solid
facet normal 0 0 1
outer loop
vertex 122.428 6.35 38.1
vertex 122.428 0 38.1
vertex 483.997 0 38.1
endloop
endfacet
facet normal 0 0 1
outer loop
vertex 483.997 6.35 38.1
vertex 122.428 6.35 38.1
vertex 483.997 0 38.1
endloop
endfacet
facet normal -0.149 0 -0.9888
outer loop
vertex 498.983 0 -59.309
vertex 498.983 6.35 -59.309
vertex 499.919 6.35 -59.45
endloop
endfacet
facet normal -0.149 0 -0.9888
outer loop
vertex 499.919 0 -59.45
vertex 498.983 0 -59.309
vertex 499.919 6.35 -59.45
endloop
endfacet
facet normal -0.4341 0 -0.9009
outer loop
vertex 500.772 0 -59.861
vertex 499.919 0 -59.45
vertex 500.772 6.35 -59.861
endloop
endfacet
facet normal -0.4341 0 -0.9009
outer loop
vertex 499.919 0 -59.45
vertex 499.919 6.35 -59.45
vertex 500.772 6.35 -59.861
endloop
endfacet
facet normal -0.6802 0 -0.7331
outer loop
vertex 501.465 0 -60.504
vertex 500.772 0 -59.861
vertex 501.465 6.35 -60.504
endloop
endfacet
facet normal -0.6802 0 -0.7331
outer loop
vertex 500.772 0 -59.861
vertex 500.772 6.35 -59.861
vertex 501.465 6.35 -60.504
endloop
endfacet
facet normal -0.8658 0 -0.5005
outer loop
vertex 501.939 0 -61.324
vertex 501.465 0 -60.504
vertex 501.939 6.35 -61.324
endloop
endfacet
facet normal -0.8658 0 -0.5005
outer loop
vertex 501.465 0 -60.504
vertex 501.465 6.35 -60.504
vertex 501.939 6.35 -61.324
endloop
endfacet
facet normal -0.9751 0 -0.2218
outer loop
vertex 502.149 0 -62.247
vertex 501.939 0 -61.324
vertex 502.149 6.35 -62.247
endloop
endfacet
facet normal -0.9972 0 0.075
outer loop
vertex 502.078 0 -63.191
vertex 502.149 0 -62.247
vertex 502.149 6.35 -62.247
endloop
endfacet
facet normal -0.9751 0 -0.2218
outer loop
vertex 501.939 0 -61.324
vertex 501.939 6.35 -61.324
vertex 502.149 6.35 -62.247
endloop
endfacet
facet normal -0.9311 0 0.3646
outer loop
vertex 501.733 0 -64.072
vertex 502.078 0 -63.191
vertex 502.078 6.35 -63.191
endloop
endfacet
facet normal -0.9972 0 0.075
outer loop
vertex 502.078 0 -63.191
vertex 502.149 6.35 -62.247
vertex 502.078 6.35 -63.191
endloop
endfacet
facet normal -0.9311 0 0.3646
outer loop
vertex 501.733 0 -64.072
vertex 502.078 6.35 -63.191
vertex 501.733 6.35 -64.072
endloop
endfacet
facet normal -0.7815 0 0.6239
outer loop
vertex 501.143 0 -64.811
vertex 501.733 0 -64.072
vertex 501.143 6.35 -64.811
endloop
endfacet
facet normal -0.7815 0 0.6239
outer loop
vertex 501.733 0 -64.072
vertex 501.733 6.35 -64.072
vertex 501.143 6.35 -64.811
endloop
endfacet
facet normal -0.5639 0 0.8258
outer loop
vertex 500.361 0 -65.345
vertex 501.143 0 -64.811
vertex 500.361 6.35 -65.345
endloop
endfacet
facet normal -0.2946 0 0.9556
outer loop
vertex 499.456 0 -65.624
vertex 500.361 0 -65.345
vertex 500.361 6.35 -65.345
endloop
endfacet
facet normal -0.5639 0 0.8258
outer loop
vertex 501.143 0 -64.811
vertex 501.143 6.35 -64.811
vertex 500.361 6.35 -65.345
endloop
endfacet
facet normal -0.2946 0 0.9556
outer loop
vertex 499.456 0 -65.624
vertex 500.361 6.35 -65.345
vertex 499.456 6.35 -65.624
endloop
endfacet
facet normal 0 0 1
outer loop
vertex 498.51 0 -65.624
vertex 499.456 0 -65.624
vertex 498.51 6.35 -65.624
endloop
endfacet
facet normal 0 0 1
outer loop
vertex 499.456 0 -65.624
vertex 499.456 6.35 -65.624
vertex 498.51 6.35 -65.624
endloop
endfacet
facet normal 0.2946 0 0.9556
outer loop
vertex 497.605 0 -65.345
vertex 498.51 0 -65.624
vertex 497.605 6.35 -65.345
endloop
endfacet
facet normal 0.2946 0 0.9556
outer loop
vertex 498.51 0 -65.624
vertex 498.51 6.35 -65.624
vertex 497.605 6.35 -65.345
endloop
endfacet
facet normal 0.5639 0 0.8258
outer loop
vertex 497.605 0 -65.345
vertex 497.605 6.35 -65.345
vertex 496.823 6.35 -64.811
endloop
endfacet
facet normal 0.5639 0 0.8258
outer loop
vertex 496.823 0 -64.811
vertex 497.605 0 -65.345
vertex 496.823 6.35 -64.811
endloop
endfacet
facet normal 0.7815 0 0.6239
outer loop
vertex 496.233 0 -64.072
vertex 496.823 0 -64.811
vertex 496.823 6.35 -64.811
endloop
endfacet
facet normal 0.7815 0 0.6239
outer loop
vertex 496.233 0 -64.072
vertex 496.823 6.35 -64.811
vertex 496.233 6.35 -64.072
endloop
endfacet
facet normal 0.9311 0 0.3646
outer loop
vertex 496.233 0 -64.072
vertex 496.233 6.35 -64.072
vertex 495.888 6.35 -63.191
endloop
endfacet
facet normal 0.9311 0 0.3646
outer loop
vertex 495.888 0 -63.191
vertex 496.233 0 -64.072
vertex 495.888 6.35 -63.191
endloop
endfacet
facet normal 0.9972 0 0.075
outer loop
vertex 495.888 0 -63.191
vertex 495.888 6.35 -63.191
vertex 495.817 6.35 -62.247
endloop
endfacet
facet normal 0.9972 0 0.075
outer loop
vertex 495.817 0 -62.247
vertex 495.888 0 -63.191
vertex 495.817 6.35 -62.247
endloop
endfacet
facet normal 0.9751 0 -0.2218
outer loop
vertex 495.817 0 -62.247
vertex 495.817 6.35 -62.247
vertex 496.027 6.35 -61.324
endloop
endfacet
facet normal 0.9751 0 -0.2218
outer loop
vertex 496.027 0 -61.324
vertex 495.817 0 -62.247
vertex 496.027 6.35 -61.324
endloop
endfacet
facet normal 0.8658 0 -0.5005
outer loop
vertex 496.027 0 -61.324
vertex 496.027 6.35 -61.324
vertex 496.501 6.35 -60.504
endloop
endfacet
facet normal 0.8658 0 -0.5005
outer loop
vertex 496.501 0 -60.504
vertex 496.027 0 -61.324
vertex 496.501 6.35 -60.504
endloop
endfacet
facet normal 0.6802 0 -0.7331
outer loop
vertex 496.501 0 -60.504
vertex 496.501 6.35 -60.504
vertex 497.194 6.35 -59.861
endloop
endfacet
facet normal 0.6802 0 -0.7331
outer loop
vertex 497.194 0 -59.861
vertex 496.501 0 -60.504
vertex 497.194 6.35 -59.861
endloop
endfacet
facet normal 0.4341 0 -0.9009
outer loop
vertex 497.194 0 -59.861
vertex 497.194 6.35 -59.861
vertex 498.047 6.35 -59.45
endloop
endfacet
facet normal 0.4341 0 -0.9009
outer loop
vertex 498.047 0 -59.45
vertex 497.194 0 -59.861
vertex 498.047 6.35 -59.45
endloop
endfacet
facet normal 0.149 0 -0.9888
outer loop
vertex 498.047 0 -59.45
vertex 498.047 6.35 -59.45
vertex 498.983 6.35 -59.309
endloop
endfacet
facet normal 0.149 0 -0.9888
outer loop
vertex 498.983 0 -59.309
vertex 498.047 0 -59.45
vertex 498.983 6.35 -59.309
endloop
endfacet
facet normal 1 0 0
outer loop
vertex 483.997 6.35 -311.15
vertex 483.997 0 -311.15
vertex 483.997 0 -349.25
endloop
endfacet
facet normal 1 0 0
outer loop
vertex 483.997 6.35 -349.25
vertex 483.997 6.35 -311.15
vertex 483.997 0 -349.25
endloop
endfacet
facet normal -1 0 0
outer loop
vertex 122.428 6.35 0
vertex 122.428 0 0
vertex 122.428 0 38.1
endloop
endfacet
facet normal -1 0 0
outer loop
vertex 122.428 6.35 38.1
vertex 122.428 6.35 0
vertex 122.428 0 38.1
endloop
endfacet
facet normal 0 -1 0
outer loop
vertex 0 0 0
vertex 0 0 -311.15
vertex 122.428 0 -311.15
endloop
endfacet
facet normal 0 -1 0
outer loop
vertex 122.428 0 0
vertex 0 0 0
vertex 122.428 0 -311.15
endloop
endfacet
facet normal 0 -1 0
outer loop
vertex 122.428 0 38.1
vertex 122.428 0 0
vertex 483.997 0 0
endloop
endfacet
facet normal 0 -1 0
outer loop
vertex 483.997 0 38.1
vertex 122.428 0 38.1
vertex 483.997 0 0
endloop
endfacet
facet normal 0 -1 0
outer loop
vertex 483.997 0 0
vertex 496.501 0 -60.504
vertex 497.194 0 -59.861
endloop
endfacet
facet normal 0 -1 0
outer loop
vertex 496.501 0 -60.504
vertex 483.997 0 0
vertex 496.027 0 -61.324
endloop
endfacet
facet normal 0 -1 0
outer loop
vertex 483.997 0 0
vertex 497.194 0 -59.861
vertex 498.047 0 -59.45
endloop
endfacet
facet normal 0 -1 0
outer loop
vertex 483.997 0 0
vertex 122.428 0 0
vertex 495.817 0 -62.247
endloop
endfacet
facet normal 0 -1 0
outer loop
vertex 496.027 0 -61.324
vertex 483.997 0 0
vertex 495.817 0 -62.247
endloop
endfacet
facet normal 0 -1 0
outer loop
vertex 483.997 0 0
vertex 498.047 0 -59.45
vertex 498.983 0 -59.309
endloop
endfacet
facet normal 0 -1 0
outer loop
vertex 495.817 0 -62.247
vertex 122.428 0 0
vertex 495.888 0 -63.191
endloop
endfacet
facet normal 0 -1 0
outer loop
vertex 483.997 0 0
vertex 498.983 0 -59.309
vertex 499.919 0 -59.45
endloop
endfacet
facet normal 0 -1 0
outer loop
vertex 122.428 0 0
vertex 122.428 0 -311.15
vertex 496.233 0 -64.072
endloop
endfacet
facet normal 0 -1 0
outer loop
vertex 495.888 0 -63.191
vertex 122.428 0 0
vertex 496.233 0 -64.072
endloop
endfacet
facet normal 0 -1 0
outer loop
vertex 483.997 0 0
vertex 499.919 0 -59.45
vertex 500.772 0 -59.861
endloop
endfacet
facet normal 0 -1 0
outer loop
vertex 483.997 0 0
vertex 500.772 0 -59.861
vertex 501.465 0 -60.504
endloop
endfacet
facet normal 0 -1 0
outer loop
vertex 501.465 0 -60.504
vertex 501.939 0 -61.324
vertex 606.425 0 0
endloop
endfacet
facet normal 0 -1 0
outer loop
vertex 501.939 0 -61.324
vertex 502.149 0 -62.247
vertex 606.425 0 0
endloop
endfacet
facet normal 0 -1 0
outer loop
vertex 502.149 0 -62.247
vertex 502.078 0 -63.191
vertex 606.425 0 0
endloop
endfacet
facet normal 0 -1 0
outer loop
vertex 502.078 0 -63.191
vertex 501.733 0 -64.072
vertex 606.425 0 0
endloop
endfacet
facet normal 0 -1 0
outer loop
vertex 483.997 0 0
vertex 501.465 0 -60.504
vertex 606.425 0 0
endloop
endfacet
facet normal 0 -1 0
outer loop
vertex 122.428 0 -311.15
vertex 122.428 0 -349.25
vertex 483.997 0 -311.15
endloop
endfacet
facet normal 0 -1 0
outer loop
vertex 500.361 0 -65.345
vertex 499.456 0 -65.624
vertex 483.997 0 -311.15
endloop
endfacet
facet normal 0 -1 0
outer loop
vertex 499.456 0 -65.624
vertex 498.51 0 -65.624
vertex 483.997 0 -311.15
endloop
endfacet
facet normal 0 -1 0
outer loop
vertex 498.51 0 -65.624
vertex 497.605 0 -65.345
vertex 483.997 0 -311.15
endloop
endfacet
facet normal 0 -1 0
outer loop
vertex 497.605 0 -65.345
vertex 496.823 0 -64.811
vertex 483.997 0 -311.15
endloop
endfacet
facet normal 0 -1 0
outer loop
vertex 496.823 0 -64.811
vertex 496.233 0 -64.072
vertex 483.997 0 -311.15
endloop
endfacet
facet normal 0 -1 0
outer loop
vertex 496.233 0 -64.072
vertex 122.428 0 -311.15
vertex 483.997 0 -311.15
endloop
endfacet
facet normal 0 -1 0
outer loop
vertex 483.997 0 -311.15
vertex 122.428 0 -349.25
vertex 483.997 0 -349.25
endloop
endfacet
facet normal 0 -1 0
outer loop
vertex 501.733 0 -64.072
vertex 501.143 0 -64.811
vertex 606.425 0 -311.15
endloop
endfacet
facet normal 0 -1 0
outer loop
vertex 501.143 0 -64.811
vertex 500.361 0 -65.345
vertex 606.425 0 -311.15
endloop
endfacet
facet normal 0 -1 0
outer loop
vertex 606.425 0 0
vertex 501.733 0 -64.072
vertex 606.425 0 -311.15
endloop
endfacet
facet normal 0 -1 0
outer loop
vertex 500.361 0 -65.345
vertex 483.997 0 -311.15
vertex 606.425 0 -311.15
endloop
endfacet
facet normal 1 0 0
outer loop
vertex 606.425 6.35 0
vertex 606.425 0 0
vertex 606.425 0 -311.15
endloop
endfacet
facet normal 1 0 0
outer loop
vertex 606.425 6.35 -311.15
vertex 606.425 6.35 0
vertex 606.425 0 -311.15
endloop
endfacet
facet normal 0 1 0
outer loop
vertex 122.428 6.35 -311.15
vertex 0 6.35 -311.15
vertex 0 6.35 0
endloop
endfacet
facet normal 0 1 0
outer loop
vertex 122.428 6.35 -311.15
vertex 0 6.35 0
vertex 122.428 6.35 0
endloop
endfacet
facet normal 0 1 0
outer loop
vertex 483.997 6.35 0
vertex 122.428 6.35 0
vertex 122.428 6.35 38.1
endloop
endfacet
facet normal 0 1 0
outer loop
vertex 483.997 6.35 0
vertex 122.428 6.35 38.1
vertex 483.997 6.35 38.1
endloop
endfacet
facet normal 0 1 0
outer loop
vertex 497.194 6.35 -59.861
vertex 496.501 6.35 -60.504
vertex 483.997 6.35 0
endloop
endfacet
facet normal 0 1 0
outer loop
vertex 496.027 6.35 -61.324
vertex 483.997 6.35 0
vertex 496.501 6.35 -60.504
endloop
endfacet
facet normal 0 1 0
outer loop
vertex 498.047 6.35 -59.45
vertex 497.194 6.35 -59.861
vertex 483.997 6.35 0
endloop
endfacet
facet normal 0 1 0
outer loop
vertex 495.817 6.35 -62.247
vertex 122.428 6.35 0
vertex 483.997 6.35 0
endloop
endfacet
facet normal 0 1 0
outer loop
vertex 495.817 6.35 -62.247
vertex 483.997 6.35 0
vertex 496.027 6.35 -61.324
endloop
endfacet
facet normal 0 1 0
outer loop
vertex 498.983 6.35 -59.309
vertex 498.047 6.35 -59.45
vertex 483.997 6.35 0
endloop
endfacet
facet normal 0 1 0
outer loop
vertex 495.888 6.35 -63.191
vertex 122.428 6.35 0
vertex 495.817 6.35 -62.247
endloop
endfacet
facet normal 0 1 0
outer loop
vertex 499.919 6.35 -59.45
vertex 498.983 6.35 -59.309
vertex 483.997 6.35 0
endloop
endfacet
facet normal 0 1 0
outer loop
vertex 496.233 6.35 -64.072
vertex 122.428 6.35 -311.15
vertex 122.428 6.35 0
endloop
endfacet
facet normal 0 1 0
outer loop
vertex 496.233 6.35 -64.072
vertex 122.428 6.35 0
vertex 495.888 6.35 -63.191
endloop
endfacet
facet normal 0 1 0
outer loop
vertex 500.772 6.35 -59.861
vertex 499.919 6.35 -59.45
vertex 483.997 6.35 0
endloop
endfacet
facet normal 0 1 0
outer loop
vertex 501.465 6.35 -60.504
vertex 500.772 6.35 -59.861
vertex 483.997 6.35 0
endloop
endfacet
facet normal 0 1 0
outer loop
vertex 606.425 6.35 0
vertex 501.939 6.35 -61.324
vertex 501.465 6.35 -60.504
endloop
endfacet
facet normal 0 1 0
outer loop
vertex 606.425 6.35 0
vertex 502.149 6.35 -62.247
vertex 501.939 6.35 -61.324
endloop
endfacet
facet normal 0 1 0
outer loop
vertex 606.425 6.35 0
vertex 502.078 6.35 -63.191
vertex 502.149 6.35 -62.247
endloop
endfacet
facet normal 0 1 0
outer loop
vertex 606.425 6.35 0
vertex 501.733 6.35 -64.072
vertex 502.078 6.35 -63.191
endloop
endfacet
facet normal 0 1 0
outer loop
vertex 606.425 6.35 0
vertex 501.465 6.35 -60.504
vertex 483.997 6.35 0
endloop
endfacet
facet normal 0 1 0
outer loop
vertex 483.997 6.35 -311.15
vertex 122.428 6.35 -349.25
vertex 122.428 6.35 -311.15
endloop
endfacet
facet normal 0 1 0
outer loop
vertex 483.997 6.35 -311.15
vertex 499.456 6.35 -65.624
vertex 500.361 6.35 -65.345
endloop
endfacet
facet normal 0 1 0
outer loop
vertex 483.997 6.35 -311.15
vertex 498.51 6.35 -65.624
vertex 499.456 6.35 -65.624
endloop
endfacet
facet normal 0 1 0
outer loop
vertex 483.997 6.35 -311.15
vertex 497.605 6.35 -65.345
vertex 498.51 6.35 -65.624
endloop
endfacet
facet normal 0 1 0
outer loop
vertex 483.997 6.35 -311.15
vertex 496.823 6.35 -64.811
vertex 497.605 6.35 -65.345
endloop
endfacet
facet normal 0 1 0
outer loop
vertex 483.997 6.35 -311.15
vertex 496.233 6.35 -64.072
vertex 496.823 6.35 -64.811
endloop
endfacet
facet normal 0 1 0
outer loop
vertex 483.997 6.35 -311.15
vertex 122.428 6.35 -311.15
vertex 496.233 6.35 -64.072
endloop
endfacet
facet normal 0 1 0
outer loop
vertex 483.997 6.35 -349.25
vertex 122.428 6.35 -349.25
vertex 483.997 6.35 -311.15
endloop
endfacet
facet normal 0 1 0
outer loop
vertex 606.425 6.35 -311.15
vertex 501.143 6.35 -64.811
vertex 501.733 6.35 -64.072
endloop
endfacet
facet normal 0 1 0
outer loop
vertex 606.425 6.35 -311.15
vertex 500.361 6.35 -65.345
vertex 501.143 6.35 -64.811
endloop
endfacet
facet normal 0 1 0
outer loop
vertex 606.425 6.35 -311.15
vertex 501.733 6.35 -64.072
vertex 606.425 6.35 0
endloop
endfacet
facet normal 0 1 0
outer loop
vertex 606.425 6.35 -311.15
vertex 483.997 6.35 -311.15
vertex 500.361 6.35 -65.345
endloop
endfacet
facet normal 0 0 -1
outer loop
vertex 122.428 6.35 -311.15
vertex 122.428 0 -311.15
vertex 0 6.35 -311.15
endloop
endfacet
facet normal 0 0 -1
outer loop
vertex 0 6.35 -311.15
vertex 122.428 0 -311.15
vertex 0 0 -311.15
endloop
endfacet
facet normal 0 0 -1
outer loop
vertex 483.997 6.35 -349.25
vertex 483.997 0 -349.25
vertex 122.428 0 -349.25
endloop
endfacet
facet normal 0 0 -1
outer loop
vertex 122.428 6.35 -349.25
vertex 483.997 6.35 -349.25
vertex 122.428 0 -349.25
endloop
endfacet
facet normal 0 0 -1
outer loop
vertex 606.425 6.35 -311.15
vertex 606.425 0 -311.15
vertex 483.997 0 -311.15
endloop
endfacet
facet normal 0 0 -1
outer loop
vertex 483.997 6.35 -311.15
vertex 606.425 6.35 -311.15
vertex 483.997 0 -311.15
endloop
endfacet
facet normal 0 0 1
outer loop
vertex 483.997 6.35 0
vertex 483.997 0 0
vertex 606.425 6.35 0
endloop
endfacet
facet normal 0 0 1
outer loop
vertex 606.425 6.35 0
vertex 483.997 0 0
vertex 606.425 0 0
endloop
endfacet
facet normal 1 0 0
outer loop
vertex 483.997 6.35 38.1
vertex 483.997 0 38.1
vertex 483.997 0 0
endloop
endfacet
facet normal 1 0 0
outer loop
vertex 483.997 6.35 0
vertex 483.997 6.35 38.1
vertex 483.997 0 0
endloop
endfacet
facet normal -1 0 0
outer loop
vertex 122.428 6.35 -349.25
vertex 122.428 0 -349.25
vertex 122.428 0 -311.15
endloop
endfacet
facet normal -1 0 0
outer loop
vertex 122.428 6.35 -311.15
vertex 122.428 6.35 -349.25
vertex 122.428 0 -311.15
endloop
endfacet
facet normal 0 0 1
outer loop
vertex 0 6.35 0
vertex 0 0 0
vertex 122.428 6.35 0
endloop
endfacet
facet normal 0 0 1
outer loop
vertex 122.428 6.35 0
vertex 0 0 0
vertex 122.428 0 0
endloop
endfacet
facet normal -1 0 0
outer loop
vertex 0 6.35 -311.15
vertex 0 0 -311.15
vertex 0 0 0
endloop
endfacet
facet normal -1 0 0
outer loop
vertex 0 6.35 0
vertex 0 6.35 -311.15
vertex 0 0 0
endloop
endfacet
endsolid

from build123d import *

# Parameters (mm, degrees)
BOSS_EXTRUDE1_DEPTH = 6.35
SKETCH2_R           = 3.175
CUT_EXTRUDE1_DEPTH  = 700.833669971


with BuildPart() as part:
    # Sketch1 → Boss-Extrude1 (new body)
    with BuildSketch(Plane(origin=(0, 0, 0), x_dir=(1, 0, 0), z_dir=(0, 1, 0))):
        Polygon((122.428, 0), (122.428, -38.1), (483.997, -38.1), (483.997, 0), (606.425, 0), (606.425, 311.15), (483.997, 311.15), (483.997, 349.25), (122.428, 349.25), (122.428, 311.15), (0, 311.15), (0, 0), align=None)
    extrude(amount=BOSS_EXTRUDE1_DEPTH)

    # Sketch2 → Cut-Extrude1 (cut, through all)
    with BuildSketch(Plane(origin=(0, 6.35, 0), x_dir=(1, 0, 0), z_dir=(0, 1, 0))):
        with Locations(Location((498.983, 62.484, 0), (0, 0, 270))):
            Circle(SKETCH2_R)
    extrude(amount=-CUT_EXTRUDE1_DEPTH, mode=Mode.SUBTRACT)


solid = part.part
